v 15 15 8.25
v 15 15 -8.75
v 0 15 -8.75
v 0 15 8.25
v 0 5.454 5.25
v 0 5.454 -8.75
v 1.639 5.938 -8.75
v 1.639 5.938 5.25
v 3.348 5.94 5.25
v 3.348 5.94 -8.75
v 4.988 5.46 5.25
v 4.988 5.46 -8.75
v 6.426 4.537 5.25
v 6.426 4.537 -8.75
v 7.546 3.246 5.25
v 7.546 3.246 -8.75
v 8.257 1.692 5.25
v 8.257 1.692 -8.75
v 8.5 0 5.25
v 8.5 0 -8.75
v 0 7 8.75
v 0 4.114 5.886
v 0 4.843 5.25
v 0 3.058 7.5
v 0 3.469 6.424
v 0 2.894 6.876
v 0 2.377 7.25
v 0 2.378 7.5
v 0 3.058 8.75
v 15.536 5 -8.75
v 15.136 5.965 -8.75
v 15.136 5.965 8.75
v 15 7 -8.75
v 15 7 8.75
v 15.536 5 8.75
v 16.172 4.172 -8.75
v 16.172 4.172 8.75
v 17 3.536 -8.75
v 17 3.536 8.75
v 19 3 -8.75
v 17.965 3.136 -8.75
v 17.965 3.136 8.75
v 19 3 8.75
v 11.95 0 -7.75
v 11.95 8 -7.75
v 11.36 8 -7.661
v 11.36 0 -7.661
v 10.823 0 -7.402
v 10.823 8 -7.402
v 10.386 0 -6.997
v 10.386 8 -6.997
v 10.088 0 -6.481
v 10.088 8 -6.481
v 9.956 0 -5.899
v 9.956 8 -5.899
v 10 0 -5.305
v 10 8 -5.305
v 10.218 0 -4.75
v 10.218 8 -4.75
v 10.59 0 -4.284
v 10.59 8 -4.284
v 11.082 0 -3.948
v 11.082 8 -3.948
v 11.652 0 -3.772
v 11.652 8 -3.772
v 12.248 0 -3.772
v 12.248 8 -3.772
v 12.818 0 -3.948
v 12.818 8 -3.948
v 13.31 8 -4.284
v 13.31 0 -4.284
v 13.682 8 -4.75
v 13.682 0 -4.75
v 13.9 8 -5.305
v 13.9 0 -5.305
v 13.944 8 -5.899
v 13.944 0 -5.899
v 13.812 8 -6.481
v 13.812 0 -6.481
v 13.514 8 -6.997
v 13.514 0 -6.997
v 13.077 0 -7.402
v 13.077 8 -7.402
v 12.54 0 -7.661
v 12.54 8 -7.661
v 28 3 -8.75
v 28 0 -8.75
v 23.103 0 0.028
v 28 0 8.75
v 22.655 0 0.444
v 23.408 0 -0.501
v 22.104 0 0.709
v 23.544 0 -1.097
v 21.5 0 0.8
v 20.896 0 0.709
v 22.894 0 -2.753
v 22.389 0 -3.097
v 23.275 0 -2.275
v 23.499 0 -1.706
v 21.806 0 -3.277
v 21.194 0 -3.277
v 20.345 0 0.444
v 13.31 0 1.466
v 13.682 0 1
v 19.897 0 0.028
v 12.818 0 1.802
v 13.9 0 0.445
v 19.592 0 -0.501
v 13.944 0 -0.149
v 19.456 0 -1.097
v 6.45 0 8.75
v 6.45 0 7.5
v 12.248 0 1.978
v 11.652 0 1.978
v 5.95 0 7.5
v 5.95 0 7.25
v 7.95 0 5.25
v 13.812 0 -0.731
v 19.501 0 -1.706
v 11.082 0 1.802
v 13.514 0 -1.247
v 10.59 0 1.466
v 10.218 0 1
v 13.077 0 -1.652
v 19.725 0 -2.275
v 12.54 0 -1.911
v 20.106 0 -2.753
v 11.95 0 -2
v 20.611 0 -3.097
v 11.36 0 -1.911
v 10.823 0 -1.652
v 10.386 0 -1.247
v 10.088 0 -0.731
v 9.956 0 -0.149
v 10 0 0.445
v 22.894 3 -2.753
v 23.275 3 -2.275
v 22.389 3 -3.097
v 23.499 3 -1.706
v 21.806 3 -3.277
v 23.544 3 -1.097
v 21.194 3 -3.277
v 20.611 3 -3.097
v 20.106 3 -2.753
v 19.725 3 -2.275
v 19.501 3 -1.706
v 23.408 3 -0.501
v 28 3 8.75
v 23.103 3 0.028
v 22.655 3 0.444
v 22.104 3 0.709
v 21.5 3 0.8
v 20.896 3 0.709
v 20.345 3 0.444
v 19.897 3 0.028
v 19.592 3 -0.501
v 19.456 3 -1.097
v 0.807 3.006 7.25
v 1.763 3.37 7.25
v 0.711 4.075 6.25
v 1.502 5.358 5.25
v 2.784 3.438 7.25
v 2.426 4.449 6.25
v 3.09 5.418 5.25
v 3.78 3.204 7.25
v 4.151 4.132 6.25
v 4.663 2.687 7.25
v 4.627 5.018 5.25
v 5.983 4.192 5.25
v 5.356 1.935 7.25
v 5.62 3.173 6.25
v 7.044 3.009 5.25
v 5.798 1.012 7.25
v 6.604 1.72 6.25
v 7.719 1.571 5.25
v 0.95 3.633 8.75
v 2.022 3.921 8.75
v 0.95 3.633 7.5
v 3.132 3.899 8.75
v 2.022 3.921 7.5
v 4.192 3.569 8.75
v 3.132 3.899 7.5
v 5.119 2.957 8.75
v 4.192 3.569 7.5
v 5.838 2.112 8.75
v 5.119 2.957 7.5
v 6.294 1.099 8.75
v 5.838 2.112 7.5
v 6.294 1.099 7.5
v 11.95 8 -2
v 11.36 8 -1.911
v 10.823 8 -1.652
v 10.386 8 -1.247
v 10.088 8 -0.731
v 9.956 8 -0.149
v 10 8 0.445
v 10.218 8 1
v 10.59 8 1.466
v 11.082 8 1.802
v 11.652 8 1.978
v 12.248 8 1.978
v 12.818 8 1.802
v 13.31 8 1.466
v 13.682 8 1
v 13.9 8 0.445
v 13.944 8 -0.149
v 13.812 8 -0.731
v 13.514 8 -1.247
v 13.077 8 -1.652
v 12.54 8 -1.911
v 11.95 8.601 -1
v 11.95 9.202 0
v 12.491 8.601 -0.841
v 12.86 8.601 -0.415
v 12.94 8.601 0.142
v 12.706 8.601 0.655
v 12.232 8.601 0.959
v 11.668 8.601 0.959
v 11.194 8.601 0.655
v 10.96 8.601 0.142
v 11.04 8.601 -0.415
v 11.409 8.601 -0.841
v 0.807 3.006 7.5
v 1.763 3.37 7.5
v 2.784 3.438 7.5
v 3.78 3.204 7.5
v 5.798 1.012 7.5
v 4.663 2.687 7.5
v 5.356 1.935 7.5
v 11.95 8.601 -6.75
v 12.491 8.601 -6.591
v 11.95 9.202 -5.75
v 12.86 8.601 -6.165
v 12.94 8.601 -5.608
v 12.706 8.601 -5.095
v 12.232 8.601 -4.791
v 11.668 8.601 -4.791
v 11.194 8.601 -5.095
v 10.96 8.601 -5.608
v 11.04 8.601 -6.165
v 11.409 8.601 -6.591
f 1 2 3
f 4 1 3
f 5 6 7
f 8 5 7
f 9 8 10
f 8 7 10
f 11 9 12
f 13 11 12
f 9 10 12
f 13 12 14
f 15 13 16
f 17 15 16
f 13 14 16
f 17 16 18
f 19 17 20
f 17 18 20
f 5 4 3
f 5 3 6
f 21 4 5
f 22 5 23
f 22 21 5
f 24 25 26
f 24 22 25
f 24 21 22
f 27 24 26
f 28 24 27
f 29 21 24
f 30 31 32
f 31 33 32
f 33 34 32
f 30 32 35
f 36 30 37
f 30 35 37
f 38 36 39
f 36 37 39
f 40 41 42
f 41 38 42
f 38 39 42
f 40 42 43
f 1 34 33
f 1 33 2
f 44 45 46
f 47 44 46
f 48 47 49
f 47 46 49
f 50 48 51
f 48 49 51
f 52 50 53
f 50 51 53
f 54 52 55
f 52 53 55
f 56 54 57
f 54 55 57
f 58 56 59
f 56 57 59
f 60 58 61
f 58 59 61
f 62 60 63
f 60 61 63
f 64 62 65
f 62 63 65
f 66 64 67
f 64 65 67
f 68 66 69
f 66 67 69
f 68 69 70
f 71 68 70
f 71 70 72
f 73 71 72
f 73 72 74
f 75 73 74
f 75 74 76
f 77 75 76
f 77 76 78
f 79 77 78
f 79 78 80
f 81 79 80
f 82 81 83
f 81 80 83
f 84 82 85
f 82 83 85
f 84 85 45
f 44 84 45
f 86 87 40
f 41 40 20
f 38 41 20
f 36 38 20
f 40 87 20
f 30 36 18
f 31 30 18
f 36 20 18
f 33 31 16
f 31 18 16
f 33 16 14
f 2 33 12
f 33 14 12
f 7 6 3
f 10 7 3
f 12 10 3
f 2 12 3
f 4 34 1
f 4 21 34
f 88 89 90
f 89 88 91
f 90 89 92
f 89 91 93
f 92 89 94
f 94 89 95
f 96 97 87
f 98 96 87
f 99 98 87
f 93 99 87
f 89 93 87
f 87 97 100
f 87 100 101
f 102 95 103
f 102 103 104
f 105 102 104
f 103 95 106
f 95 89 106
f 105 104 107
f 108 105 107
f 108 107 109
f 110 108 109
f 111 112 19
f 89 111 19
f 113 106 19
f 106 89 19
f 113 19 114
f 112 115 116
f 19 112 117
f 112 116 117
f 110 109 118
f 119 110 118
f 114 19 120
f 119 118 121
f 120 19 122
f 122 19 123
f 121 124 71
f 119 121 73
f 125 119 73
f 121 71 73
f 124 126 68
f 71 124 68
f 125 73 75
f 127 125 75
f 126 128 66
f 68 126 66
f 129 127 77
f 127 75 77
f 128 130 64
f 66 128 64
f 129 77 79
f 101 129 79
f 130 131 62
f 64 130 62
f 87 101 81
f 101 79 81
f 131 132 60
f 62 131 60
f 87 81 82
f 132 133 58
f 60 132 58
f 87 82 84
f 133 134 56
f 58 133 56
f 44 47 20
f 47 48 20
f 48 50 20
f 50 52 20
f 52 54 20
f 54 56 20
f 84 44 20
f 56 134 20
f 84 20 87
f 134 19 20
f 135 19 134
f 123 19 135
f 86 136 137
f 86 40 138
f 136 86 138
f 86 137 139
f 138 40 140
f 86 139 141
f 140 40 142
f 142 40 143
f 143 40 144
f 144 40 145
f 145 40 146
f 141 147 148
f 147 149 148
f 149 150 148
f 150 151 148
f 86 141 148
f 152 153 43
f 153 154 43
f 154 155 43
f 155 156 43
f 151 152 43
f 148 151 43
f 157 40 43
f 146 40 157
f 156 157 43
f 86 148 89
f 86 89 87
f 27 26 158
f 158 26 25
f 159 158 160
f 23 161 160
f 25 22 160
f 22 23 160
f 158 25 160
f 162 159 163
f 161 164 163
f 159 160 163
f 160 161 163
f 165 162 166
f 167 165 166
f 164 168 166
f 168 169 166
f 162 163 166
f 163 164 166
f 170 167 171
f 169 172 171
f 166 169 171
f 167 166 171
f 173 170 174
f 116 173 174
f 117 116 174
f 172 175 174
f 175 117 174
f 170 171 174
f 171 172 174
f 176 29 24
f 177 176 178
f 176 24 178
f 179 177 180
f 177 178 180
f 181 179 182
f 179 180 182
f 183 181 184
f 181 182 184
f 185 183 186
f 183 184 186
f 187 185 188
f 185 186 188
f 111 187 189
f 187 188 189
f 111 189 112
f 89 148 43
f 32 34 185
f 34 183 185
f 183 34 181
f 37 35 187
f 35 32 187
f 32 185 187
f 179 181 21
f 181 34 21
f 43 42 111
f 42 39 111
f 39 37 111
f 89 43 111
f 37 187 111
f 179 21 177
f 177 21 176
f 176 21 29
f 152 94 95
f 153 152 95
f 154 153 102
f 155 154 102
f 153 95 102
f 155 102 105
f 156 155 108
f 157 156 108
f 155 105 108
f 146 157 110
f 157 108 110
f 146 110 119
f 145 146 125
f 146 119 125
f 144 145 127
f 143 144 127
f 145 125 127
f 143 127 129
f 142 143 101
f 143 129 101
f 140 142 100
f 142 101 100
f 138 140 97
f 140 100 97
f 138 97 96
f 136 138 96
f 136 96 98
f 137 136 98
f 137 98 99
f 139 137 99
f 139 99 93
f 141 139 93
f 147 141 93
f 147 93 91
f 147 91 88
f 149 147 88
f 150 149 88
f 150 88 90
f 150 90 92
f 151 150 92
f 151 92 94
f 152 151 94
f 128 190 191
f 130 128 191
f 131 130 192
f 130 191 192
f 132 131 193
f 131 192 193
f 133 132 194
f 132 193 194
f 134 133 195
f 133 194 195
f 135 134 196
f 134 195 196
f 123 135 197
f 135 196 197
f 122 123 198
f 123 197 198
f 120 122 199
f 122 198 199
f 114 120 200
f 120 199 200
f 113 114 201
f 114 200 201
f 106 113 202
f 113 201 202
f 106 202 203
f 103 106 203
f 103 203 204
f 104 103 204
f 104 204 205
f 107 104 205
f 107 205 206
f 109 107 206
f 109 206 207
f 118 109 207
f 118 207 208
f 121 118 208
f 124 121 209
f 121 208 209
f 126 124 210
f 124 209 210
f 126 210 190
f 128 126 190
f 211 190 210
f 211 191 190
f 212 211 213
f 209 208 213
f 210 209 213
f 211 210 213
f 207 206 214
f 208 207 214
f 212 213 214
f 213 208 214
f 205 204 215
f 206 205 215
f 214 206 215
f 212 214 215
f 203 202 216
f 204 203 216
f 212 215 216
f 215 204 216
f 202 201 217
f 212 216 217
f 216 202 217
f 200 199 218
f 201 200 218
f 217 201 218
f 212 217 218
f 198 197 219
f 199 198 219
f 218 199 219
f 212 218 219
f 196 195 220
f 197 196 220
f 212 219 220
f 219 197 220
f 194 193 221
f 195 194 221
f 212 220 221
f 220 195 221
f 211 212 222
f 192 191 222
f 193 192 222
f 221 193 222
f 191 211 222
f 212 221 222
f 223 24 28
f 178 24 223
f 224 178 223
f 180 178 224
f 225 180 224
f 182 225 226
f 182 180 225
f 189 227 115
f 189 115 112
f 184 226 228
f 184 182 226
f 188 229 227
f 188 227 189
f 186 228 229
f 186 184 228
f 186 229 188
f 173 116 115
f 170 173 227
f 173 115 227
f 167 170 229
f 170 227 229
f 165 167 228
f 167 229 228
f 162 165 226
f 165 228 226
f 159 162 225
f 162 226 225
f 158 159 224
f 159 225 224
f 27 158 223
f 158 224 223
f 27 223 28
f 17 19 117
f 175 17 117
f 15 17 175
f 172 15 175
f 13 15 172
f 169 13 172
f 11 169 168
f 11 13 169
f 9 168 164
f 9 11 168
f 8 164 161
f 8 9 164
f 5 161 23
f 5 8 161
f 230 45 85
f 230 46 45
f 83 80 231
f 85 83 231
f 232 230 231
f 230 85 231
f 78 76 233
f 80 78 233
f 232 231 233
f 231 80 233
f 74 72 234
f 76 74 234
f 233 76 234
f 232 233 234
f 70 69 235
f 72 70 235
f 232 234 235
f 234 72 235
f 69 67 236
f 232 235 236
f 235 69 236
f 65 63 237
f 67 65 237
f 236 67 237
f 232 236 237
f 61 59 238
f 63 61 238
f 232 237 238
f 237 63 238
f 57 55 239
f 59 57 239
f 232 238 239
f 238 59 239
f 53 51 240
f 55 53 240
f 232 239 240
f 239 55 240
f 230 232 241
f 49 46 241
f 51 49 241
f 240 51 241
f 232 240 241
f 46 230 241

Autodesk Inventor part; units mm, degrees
ref_plane "YZ Plane" through (0, 0, 0) normal (1, 0, 0) x (0, 1, 0)
ref_plane "XZ Plane" through (0, 0, 0) normal (0, 1, 0) x (-1, 0, 0)
sketch "Skizze1" plane through (0, 0, 0) normal (0, 0, 1) x (1, 0, 0)
  line L0 (6.45, 0) -> (15, 0)
  line L1 (15, 0) -> (15, 15)
  line L2 (15, 15) -> (0, 15)
  line L3 (0, 15) -> (0, 3.0582)
  arc A0 (6.45, 0) -> (0, 3.0582) centre (2.5, 0) ccw
  line L4 (-3, 0) -> (18, 0) projected
  line L5 (0, -3) -> (0, 18) projected
  point P0 (0, 0)
  dimension "d0" = 15
  dimension "d1" = 15
  dimension "d2" = 7.9
  dimension "d3" = 2.5
extrude "Extrusion1" add sketch "Skizze1" along normal mid plane 17.5 contours A0 L3 L2 L1 L0
ref_plane "Arbeitsebene1" through (0, 0, 7.5) normal (0, 0, 1) x (1, 0, 0)
sketch "Skizze2" plane through (0, 0, 7.5) normal (0, 0, 1) x (1, 0, 0)
  circle A0 centre (2.5, 0) radius 3.95
  arc A1 (6.45, 0) -> (0, 3.0582) centre (2.5, 0) ccw projected
  circle A2 centre (2.5, 0) radius 3.45
  line L0 (0, 3.0582) -> (0, 2.3775)
  line L1 (15, 0) -> (6.45, 0) projected
  line L2 (6.45, 0) -> (5.95, 0)
  point P0 (0, 0)
  point P1 (0, 3.0582)
  dimension "d7" = 7.9
  dimension "d8" = 6.9
extrude "Extrusion2" add sketch "Skizze2" against normal up to surface (16.25 mm away) contours L2 A2 L0 A0 picked at (6.25, 0.2945)
sketch "Skizze4" plane through (15, 0, 8.75) normal (1, 0, 0) x (0, 0, -1)
  line L0 (17.5, 3) -> (0, 3)
  line L1 (0, 3) -> (0, 0)
  line L2 (0, 0) -> (17.5, 0)
  line L3 (17.5, 0) -> (17.5, 3)
  line L4 (17.5, 15) -> (17.5, 0) projected
  line L5 (0, 0) -> (0, 15) projected
  line L6 (17.5, 0) -> (0, 0) projected
  point P0 (8.75, 0)
  dimension "d11" = 3
extrude "Extrusion3" add sketch "Skizze4" along normal blind 13
fillet "Rundung1" radius 4 1 edges at (15, 3, 0)
sketch "Skizze5" plane through (28, 3, 8.75) normal (0, 1, 0) x (1, 0, 0)
  line L0 (-9, 0) -> (0, 0) projected
  line L1 (0, 17.5) -> (0, 0) projected
  point P0 (-28, 8.75)
  point P1 (-6.5, 10)
  dimension "d15" = 10
  dimension "d16" = 6.5
hole "Bohrung1" at (21.5, 3, -1.25) direction (0, -1, 0) diameter 4.1 end through all
sketch "Skizze6" plane through (5.95, 0, -8.75) normal (0, -1, 0) x (1, 0, 0)
  line L0 (0, 0) -> (22.05, 0) projected
  line L1 (-11.55, 8.75) -> (27.65, 8.75) projected
  line L2 (0, 16.25) -> (0, 0) projected
  point P0 (-5.95, 8.75)
  point P1 (6, 3)
  point P2 (6, 8.75)
  dimension "d24" = 3
  dimension "d25" = 6
hole "Bohrung2" at (11.95, 0, -5.75) at (11.95, 0, 0) direction (0, 1, 0) diameter 4 depth 8 tip angle 118
sketch "Skizze7" plane through (0, 0, -8.75) normal (0, 0, -1) x (-1, 0, 0)
  circle A0 centre (-2.5, 0) radius 6
  arc A1 (0, 2.3775) -> (-5.95, 0) centre (-2.5, 0) ccw projected
  line L0 (-5.95, 0) -> (-8.5, 0)
  line L1 (-5.95, 0) -> (-28, 0) projected
  line L2 (0, 2.3775) -> (0, 15) projected
  line L3 (0, 2.3775) -> (0, 5.4544)
  point P0 (0, 0)
  dimension "d34" = 12
extrude "Extrusion4" cut sketch "Skizze7" against normal blind 14 contours L2 A1 L0 A0 picked at (-7.6008, 0.4409)
chamfer "Fasen1" distance 2 angle 45 1 edges at (3.7801, 3.2037, 5.25)
sketch "Skizze8" plane through (0, 3.0582, 8.75) normal (-1, 0, 0) x (0, 0, 1)
  line L0 (0, 3.9418) -> (0, 11.9418) projected
  line L1 (0, 3.9418) -> (-0.5, 11.9418)
  line L2 (-17.5, 11.9418) -> (0, 11.9418) projected
  line L3 (-0.5, 11.9418) -> (0, 11.9418)
  line L4 (0, 11.9418) -> (0, 3.9418)
  point P0 (-8.75, -3.0582)
  dimension "d40" = 8
  dimension "d41" = 0.5
extrude "Extrusion5" cut sketch "Skizze8" against normal through all
equation "\"d0\" = Tiefe_Gegenstueck"
equation "\"d1\" = Breite_Grundkoerper"
equation "\"d2\" = D_Scheibe"
equation "\"d3\" = Abstand_D_Scheibe"
equation "\"d4\" = Tiefe_Grundkoerper"
equation "\"d7\" = D_Scheibe"
equation "\"d11\" = Breite_Absatz"
equation "\"d12\" = Tiefe_Absatz"
equation "\"d14\" = Radius_Absatz"
equation "\"d15\" = Pos_Bohrung_Kolben_y"
equation "\"d16\" = Pos_Bohrung_Kolben_x"
equation "\"d17\" = D_Kolbenbohrung"
equation "\"d24\" = Zentrierbohrung_y"
equation "\"d25\" = Zentrierbohrung_x"
equation "\"d26\" = D_Zentrierbohrung"
equation "\"d31\" = T_Zentrierbohrung"
equation "\"Breite_Grundkoerper\" = 15"
equation "\"D_Scheibe\" = 7.9"
equation "\"Abstand_D_Scheibe\" = 2.5"
equation "\"Abstand_Arbeitsebene\" = 2"
equation "\"Tiefe_Grundkoerper\" = 17.5"
equation "\"Tiefe_Gegenstueck\" = 15"
equation "\"Breite_Absatz\" = 3"
equation "\"Tiefe_Absatz\" = 13"
equation "\"Radius_Absatz\" = 4"
equation "\"Pos_Bohrung_Kolben_x\" = 6.5"
equation "\"Pos_Bohrung_Kolben_y\" = 10"
equation "\"D_Kolbenbohrung\" = 4.1"
equation "\"Zentrierbohrung_y\" = 3"
equation "\"T_Zentrierbohrung\" = 8"
equation "\"D_Zentrierbohrung\" = 4"
equation "\"Zentrierbohrung_x\" = 6"
equation "\"R_Kanten\" = 0.5"
properties part number "JH_int_Greiferkoerper_Gegenstueck"
